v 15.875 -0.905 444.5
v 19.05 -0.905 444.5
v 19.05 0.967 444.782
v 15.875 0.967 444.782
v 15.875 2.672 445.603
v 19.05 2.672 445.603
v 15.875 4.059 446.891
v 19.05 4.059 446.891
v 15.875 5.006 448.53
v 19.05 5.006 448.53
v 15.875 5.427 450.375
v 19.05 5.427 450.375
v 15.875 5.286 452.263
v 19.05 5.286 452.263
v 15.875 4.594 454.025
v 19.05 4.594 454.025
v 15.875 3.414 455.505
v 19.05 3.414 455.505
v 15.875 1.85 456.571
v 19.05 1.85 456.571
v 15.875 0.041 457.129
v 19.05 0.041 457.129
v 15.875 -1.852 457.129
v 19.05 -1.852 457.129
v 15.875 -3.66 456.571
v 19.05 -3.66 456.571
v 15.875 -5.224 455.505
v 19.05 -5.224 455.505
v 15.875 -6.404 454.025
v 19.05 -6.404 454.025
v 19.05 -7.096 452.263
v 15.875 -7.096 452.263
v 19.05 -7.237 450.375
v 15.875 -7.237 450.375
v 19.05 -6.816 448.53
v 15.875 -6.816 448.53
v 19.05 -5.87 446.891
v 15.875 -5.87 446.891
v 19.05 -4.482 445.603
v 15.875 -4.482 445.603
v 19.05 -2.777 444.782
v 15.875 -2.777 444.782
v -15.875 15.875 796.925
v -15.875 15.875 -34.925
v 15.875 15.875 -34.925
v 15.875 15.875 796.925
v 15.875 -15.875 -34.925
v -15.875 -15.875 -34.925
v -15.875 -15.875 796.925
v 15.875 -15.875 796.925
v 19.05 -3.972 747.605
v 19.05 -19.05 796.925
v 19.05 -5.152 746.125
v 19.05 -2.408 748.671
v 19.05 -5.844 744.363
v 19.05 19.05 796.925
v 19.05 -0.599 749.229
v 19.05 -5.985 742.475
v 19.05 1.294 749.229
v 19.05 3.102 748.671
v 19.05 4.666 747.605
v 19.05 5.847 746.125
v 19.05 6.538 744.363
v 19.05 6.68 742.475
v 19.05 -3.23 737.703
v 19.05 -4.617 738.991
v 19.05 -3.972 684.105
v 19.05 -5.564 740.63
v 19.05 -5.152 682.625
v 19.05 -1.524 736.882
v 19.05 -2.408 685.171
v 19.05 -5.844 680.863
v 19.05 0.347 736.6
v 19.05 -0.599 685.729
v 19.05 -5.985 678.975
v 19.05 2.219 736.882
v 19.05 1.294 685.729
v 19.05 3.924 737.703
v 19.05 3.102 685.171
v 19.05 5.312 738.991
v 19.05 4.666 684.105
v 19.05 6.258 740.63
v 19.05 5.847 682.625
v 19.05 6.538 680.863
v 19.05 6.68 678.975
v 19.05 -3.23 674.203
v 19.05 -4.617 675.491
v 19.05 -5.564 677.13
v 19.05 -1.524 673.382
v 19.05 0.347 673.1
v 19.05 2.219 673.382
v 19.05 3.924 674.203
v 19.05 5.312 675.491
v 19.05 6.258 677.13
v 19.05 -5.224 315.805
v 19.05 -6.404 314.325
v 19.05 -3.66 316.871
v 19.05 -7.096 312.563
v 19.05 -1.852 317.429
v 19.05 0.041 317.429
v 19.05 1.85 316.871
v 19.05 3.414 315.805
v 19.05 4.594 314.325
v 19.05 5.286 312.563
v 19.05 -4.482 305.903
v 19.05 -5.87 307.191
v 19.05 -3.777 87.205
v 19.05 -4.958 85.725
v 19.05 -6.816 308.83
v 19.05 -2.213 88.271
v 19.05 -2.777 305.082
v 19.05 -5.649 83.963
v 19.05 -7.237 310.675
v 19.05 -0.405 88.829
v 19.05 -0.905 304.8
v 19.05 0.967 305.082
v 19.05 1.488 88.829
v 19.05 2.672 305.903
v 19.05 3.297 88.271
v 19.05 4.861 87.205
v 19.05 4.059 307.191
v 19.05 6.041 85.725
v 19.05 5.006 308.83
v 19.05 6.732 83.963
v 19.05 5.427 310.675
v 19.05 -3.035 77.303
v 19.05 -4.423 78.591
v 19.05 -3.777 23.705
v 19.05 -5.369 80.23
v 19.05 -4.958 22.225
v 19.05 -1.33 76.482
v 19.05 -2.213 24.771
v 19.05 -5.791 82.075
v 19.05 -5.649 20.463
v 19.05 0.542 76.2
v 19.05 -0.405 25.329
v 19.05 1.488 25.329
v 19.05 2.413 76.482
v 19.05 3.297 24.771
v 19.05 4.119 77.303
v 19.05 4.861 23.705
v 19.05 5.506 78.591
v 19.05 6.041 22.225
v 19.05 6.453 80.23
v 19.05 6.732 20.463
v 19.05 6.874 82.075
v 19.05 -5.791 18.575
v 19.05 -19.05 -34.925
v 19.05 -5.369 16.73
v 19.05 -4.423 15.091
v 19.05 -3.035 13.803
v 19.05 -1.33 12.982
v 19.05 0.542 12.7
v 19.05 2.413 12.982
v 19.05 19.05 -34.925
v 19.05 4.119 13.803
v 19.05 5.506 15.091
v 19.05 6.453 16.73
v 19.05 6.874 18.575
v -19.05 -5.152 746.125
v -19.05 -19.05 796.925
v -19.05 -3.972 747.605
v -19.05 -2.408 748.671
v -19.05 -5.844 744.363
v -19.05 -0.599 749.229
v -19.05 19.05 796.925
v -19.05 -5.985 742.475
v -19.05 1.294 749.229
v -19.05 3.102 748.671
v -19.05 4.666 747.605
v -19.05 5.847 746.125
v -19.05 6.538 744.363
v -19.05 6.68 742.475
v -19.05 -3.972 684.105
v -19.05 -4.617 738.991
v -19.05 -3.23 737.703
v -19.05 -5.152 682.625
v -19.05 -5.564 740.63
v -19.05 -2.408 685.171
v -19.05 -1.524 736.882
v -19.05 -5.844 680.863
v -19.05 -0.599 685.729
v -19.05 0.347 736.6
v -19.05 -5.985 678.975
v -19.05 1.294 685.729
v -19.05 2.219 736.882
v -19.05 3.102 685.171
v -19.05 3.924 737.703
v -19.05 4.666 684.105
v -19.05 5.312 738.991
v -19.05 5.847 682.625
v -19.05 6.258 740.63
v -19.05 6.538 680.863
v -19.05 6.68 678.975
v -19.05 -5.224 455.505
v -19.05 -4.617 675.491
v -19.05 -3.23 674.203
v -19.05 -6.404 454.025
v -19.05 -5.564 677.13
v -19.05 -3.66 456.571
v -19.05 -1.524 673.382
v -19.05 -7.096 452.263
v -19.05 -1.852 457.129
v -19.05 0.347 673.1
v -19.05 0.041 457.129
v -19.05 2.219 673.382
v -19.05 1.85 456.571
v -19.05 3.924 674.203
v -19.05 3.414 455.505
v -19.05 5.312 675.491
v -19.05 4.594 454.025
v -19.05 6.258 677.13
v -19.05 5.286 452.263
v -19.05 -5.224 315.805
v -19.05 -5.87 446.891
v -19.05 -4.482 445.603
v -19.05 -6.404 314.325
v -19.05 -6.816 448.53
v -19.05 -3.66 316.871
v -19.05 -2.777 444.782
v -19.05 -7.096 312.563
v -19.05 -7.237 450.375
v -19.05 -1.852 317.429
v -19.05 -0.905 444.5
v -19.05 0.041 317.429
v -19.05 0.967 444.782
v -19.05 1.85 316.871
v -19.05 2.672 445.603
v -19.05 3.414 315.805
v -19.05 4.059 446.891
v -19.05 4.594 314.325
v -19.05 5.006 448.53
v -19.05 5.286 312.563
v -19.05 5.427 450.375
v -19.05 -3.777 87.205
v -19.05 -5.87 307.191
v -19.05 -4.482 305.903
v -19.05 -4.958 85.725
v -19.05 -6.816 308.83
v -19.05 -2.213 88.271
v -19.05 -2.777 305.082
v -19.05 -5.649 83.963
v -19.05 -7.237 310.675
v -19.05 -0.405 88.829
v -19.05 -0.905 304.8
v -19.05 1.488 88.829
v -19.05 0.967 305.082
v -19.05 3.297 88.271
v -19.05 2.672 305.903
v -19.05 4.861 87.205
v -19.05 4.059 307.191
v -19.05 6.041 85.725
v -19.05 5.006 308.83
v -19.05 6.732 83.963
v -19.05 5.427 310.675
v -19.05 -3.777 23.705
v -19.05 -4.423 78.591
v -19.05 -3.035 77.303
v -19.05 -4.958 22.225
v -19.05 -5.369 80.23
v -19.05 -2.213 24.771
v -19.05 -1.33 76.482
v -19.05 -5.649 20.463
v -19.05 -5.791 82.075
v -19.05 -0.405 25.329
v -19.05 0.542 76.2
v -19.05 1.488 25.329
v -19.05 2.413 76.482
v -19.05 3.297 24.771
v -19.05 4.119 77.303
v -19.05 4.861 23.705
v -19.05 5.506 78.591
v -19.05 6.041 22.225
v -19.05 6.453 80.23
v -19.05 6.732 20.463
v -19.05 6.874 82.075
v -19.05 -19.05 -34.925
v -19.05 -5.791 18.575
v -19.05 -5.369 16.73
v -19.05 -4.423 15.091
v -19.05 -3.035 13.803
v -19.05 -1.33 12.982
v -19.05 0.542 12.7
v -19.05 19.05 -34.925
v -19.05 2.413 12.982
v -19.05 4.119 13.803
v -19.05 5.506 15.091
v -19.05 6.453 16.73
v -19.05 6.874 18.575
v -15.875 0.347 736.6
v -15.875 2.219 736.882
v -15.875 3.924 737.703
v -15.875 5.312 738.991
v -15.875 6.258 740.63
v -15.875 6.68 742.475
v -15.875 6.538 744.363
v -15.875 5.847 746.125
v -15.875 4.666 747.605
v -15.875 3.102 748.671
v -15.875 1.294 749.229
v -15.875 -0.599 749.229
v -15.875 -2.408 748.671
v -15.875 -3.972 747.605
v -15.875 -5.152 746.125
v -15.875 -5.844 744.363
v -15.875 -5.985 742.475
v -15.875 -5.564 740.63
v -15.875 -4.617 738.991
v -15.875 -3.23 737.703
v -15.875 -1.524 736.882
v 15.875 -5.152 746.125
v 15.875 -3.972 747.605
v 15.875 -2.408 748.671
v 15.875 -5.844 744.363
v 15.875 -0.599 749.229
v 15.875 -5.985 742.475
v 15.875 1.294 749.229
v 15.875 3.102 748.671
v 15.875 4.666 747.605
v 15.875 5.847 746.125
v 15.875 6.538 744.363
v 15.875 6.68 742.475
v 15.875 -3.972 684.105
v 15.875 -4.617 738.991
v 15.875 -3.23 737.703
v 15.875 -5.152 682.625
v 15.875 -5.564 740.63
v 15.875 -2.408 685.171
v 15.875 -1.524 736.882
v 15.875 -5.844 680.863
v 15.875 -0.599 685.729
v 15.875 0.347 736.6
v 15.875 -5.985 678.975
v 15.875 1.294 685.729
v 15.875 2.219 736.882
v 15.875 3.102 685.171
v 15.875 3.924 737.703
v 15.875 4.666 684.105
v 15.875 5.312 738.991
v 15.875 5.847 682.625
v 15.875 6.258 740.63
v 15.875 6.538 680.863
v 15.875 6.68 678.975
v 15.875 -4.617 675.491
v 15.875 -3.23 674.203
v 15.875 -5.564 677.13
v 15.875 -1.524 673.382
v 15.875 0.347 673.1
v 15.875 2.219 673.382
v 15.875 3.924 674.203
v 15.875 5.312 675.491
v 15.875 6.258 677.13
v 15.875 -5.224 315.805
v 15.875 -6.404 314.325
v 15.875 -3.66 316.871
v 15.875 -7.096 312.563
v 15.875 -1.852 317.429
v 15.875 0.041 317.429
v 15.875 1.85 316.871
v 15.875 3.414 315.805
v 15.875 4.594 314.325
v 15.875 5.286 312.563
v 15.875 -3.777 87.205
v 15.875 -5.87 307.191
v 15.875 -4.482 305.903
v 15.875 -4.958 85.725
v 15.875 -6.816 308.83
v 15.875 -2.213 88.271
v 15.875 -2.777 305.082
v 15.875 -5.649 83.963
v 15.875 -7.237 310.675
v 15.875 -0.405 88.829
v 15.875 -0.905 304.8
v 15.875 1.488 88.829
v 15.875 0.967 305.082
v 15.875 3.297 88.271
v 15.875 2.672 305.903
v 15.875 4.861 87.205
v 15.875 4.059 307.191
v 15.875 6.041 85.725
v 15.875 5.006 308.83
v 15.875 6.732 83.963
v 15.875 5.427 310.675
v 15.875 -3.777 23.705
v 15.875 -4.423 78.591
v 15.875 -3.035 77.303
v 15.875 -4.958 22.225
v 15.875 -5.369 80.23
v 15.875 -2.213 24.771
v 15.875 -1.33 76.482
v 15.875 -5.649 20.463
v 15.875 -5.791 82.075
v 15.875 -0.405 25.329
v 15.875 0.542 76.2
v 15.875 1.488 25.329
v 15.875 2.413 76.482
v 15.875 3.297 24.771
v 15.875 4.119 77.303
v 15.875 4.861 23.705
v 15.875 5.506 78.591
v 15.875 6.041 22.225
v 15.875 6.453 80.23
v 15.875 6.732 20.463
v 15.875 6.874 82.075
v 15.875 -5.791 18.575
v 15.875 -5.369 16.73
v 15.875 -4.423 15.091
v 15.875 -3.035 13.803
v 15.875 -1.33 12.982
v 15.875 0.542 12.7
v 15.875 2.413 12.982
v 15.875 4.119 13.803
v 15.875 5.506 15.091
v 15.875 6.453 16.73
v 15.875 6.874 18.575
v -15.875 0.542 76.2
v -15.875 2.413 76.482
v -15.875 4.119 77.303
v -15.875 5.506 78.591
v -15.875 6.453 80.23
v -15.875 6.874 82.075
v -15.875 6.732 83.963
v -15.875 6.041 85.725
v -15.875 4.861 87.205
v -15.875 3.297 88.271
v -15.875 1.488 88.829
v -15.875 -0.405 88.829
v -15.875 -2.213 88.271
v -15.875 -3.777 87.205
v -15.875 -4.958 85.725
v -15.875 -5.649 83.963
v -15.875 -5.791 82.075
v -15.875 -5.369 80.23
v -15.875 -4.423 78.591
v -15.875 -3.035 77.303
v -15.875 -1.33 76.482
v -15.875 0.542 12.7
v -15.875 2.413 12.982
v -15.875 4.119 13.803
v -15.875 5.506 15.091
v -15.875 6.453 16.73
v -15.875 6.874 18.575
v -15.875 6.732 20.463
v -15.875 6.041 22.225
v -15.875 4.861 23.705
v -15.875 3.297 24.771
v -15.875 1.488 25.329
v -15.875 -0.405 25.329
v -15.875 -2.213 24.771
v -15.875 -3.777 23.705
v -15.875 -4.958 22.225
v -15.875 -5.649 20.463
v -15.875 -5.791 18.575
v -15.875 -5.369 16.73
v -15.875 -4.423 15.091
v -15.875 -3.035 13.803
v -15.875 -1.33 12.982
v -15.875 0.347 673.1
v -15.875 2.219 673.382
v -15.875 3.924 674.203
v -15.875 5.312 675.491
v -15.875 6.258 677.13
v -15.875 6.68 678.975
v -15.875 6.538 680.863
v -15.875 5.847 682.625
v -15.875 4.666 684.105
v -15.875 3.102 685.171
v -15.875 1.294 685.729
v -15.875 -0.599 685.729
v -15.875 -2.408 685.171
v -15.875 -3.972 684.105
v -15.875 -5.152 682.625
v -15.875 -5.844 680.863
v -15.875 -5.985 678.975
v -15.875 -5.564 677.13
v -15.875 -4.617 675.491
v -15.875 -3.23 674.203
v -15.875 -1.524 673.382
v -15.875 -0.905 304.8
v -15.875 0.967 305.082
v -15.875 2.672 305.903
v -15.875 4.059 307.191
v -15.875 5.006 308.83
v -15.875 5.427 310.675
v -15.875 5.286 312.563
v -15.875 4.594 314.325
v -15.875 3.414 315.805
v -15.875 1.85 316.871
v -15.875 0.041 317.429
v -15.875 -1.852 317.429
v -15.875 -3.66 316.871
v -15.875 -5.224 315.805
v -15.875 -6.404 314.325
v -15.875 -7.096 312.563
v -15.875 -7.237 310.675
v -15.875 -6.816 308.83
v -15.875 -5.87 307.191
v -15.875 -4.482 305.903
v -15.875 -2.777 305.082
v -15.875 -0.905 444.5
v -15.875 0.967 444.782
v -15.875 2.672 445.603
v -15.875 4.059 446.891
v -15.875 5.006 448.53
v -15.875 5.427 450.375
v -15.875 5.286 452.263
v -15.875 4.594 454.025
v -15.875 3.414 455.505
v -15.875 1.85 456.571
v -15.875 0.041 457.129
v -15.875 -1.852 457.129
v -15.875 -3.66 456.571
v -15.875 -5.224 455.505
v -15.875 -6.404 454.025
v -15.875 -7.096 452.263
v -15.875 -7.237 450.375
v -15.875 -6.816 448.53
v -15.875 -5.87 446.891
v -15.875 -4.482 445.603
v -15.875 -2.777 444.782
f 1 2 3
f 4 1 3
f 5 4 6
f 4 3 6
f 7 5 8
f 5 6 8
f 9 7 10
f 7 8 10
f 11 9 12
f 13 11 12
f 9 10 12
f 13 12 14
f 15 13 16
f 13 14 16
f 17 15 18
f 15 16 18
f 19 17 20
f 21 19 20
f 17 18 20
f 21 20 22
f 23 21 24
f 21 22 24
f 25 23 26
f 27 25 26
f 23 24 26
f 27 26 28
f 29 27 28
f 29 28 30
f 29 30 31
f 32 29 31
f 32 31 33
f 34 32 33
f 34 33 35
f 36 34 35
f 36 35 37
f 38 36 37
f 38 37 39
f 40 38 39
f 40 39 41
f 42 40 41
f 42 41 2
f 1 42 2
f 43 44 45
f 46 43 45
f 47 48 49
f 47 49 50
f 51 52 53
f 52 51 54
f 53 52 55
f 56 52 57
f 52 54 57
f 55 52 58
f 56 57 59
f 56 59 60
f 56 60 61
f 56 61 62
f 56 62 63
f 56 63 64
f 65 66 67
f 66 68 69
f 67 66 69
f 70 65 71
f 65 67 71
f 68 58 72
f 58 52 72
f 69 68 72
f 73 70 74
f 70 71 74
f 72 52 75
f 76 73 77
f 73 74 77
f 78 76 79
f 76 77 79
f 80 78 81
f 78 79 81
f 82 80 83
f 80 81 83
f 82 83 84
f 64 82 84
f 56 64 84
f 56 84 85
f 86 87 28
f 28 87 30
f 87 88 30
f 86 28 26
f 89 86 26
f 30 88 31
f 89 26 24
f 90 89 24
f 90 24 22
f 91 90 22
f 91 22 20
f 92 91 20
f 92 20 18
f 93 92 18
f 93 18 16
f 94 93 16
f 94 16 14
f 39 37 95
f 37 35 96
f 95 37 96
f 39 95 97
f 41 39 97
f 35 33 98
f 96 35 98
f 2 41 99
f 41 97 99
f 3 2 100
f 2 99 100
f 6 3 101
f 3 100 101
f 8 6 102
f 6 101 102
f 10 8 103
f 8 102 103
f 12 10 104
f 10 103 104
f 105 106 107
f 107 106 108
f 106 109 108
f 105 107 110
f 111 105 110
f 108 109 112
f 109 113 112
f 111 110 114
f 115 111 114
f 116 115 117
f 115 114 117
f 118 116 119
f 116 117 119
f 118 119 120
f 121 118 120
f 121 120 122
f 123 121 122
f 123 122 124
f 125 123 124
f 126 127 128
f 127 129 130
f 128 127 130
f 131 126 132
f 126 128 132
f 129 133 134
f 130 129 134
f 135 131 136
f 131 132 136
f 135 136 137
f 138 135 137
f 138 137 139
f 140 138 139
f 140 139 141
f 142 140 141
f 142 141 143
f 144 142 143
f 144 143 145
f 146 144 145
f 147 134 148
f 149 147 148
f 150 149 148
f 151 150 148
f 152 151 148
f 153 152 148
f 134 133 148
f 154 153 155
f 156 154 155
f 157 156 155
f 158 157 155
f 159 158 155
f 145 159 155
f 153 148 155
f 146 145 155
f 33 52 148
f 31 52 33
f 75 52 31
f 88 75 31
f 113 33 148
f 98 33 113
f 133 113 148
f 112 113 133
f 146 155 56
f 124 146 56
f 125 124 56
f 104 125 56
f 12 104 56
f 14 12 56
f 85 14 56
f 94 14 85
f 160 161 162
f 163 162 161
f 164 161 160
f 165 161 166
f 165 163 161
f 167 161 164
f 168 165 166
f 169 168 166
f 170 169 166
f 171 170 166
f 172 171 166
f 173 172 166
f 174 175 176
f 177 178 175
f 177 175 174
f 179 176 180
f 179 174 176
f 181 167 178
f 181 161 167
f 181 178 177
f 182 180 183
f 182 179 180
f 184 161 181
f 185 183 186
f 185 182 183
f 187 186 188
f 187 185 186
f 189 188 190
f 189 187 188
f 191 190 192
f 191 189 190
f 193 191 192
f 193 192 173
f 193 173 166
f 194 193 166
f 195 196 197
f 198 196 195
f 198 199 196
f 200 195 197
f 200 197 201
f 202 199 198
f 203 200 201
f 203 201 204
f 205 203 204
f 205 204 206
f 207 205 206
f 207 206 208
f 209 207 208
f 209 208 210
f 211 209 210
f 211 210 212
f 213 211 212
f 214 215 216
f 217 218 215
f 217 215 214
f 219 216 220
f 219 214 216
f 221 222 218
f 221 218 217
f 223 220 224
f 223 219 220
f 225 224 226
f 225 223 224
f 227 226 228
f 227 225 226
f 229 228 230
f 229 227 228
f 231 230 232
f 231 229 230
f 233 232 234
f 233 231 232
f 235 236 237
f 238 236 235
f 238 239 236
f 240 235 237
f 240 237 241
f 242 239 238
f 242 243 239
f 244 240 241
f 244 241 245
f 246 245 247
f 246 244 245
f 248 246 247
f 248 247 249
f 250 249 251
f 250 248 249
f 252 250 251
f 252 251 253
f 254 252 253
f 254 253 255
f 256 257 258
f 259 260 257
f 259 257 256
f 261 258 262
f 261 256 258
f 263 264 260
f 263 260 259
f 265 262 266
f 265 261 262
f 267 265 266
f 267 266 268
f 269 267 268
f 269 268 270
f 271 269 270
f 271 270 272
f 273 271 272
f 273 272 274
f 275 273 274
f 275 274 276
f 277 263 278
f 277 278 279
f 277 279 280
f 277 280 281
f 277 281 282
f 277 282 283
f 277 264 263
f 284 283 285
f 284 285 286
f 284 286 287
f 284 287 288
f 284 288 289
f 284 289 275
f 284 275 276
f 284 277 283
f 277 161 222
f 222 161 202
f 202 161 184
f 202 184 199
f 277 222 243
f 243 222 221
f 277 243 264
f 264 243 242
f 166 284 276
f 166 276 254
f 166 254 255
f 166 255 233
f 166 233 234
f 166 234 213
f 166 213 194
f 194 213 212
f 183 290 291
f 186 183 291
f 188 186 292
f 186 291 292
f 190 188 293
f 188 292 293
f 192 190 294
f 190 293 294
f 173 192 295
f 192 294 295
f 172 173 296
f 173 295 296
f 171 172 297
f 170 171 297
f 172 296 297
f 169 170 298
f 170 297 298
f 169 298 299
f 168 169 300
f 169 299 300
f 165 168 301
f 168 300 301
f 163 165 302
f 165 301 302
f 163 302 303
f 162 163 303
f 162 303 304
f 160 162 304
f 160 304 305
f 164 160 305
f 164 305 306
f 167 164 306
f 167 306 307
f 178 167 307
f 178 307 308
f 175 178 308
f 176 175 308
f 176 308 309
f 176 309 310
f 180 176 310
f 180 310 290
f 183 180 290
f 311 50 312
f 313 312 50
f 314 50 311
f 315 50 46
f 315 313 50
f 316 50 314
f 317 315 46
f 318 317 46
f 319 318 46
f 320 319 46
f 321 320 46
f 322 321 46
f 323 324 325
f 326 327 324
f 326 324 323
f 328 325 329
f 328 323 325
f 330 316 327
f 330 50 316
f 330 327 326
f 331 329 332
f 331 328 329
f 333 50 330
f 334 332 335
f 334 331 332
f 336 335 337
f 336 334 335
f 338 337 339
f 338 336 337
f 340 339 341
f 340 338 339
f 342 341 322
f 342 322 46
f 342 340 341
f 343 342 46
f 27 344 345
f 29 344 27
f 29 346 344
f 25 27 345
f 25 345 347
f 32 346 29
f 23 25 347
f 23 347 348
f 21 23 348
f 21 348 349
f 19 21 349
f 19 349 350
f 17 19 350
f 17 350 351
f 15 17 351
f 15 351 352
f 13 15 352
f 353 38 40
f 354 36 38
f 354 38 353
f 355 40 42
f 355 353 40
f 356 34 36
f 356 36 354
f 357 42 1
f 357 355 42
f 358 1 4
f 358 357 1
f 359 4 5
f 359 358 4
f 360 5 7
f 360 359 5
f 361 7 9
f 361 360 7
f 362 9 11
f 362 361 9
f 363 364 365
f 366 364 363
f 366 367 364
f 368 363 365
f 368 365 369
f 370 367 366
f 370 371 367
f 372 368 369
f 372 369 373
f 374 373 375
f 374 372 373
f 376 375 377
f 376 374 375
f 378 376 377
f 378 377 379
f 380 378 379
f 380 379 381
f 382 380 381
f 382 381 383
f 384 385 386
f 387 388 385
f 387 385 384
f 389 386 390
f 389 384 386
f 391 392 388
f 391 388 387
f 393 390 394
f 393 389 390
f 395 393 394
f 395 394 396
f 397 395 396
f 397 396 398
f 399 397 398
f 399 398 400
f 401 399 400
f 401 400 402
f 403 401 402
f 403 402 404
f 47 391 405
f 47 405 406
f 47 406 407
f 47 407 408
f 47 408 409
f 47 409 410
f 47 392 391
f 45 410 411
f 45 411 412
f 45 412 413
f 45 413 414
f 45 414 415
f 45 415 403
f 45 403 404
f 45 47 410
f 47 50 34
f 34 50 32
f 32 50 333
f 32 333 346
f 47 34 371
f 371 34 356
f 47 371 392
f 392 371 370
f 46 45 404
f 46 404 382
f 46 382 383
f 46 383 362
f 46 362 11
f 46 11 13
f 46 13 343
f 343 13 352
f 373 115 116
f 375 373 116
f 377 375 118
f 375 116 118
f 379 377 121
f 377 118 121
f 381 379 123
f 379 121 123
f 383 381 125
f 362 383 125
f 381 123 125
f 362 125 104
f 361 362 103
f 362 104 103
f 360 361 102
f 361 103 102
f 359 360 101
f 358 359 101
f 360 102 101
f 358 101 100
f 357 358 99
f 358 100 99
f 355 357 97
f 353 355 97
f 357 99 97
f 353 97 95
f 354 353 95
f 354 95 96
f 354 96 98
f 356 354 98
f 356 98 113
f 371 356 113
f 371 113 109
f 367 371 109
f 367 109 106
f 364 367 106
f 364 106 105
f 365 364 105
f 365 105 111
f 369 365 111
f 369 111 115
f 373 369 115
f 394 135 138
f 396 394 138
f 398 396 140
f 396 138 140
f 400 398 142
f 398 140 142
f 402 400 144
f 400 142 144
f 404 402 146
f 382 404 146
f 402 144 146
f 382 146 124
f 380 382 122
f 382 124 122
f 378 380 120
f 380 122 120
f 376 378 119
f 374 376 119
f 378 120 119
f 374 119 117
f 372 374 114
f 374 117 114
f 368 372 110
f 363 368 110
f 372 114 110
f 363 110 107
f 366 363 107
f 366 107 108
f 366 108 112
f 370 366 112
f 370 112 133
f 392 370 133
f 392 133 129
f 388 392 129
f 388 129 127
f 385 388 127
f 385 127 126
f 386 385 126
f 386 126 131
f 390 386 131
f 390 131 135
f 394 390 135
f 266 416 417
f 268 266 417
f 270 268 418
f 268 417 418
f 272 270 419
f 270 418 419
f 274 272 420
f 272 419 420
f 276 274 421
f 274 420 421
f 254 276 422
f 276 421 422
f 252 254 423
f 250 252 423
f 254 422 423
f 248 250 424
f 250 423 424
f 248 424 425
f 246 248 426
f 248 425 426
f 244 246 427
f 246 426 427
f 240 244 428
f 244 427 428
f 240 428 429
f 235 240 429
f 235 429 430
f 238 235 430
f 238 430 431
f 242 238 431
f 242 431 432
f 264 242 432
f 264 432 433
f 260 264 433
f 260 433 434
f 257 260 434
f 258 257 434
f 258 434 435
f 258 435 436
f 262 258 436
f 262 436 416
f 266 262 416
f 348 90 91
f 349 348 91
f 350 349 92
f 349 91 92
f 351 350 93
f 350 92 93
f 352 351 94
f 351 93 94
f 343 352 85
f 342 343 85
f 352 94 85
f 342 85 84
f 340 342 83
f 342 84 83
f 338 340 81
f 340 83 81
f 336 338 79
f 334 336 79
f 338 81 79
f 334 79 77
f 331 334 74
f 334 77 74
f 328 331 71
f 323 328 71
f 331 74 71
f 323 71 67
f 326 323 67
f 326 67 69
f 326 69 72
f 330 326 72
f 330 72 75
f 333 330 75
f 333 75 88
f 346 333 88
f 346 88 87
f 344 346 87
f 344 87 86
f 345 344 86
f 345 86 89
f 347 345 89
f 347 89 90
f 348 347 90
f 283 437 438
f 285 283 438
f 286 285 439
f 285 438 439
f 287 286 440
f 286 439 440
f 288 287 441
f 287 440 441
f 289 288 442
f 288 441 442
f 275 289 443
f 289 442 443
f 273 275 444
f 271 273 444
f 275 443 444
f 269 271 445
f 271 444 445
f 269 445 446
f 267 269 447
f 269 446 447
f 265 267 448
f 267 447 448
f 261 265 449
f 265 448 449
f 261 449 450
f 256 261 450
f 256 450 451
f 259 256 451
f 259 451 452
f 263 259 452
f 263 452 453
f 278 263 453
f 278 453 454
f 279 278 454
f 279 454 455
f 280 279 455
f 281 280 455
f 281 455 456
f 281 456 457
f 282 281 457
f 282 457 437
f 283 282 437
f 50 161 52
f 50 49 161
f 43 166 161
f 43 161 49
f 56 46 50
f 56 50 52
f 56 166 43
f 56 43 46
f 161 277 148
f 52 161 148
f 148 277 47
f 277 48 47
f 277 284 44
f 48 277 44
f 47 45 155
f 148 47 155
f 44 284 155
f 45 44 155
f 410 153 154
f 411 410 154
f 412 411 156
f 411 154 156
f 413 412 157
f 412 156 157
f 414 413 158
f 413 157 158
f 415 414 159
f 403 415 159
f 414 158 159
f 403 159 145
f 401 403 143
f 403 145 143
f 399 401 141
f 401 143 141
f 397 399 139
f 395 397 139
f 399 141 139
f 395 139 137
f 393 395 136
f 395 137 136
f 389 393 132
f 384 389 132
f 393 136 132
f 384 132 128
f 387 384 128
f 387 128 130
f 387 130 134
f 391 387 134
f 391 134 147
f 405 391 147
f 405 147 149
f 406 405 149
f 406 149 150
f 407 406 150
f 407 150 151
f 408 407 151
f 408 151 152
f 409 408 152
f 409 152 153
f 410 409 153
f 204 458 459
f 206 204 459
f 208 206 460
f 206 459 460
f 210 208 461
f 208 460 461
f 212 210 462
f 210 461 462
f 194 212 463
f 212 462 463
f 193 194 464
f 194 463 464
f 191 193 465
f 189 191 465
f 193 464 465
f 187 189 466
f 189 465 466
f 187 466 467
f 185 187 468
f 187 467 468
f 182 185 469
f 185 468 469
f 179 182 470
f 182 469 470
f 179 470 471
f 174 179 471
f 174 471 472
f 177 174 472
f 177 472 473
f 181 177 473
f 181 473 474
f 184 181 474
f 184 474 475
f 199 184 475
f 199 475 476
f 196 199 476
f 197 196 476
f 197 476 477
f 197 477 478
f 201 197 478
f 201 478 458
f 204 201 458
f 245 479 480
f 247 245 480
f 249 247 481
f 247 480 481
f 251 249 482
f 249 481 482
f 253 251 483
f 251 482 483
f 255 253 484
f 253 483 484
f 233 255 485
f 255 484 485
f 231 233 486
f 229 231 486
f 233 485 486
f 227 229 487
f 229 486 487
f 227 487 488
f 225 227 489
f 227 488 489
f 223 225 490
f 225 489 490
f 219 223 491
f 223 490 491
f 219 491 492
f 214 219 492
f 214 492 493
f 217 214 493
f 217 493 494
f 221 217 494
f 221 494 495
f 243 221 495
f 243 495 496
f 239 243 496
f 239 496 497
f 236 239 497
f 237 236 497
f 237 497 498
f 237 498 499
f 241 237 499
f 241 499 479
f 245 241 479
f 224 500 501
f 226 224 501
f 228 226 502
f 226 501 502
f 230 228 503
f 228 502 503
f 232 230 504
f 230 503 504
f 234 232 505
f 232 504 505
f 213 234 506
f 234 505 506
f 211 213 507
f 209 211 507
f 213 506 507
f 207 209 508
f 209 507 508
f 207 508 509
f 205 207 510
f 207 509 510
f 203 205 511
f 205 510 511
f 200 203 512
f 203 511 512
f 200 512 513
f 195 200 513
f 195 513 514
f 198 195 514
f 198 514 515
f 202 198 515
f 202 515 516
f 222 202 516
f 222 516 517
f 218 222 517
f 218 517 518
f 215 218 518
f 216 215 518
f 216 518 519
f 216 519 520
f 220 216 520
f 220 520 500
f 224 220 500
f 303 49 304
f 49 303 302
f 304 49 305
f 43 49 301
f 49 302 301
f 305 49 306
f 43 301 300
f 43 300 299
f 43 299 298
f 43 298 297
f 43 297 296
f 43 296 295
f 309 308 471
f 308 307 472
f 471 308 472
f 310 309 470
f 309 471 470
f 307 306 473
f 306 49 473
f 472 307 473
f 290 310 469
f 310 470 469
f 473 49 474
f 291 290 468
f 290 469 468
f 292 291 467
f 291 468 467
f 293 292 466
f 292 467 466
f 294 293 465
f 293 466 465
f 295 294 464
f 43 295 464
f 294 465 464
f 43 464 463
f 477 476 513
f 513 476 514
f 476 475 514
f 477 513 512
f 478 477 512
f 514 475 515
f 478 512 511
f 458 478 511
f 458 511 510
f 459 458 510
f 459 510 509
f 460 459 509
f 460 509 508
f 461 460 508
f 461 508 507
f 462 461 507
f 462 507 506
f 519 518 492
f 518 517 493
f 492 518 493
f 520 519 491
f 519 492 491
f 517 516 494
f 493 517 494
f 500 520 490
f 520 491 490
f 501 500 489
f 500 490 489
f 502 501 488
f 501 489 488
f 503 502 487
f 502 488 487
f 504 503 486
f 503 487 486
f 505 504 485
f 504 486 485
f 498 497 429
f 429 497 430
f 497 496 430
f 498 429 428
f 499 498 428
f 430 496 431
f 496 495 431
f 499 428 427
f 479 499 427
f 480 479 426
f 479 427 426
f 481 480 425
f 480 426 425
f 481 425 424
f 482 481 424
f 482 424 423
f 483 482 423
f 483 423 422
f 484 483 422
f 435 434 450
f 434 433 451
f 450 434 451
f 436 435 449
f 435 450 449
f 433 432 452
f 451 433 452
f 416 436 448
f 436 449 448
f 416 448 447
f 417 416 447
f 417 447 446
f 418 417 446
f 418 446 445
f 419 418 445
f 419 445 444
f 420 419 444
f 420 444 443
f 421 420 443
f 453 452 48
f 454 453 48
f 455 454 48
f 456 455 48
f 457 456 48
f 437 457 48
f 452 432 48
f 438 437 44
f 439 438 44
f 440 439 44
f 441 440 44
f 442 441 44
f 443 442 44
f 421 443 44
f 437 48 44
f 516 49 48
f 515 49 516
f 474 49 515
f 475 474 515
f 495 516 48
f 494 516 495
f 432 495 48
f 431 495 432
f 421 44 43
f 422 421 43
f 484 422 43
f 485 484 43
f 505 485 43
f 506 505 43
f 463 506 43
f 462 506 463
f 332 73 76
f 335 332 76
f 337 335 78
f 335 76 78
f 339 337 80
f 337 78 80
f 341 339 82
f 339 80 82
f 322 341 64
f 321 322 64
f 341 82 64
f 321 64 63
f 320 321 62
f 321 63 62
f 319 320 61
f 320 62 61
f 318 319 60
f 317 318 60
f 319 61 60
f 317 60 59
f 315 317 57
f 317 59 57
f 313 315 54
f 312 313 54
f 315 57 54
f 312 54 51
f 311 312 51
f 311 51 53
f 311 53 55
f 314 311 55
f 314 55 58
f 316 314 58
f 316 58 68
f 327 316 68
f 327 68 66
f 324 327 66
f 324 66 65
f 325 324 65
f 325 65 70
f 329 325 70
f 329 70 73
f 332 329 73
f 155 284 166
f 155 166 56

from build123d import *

# Parameters (mm, degrees)
BOSS_EXTRUDE1_START = -34.925
SKETCH1_W           = 38.1
SKETCH1_H           = 38.1
SKETCH1_W_2         = 31.75
SKETCH1_H_2         = 31.75
BOSS_EXTRUDE1_DEPTH = 831.85
SKETCH2_R           = 6.35
CUT_EXTRUDE1_DEPTH  = 799.062634212


with BuildPart() as part:
    # Sketch1 → Boss-Extrude1 (new body)
    with BuildSketch(Plane.XY.offset(BOSS_EXTRUDE1_START)):
        Rectangle(SKETCH1_W, SKETCH1_H)
        Rectangle(SKETCH1_W_2, SKETCH1_H_2, mode=Mode.SUBTRACT)
    extrude(amount=BOSS_EXTRUDE1_DEPTH)

    # Sketch2 → Cut-Extrude1 (cut, through all)
    with BuildSketch(Plane(origin=(19.05, 0, 0), x_dir=(0, 0, -1), z_dir=(1, 0, 0))):
        with Locations((-311.15, -0.905146159)):
            Circle(SKETCH2_R)
        with Locations((-450.85, -0.905146159)):
            Circle(SKETCH2_R)
        with Locations((-679.45, 0.347280154)):
            Circle(SKETCH2_R)
        with Locations((-742.95, 0.347280154)):
            Circle(SKETCH2_R)
        with Locations((-82.55, 0.541693979)):
            Circle(SKETCH2_R)
        with Locations((-19.05, 0.541693979)):
            Circle(SKETCH2_R)
    extrude(amount=-CUT_EXTRUDE1_DEPTH, mode=Mode.SUBTRACT)


solid = part.part
